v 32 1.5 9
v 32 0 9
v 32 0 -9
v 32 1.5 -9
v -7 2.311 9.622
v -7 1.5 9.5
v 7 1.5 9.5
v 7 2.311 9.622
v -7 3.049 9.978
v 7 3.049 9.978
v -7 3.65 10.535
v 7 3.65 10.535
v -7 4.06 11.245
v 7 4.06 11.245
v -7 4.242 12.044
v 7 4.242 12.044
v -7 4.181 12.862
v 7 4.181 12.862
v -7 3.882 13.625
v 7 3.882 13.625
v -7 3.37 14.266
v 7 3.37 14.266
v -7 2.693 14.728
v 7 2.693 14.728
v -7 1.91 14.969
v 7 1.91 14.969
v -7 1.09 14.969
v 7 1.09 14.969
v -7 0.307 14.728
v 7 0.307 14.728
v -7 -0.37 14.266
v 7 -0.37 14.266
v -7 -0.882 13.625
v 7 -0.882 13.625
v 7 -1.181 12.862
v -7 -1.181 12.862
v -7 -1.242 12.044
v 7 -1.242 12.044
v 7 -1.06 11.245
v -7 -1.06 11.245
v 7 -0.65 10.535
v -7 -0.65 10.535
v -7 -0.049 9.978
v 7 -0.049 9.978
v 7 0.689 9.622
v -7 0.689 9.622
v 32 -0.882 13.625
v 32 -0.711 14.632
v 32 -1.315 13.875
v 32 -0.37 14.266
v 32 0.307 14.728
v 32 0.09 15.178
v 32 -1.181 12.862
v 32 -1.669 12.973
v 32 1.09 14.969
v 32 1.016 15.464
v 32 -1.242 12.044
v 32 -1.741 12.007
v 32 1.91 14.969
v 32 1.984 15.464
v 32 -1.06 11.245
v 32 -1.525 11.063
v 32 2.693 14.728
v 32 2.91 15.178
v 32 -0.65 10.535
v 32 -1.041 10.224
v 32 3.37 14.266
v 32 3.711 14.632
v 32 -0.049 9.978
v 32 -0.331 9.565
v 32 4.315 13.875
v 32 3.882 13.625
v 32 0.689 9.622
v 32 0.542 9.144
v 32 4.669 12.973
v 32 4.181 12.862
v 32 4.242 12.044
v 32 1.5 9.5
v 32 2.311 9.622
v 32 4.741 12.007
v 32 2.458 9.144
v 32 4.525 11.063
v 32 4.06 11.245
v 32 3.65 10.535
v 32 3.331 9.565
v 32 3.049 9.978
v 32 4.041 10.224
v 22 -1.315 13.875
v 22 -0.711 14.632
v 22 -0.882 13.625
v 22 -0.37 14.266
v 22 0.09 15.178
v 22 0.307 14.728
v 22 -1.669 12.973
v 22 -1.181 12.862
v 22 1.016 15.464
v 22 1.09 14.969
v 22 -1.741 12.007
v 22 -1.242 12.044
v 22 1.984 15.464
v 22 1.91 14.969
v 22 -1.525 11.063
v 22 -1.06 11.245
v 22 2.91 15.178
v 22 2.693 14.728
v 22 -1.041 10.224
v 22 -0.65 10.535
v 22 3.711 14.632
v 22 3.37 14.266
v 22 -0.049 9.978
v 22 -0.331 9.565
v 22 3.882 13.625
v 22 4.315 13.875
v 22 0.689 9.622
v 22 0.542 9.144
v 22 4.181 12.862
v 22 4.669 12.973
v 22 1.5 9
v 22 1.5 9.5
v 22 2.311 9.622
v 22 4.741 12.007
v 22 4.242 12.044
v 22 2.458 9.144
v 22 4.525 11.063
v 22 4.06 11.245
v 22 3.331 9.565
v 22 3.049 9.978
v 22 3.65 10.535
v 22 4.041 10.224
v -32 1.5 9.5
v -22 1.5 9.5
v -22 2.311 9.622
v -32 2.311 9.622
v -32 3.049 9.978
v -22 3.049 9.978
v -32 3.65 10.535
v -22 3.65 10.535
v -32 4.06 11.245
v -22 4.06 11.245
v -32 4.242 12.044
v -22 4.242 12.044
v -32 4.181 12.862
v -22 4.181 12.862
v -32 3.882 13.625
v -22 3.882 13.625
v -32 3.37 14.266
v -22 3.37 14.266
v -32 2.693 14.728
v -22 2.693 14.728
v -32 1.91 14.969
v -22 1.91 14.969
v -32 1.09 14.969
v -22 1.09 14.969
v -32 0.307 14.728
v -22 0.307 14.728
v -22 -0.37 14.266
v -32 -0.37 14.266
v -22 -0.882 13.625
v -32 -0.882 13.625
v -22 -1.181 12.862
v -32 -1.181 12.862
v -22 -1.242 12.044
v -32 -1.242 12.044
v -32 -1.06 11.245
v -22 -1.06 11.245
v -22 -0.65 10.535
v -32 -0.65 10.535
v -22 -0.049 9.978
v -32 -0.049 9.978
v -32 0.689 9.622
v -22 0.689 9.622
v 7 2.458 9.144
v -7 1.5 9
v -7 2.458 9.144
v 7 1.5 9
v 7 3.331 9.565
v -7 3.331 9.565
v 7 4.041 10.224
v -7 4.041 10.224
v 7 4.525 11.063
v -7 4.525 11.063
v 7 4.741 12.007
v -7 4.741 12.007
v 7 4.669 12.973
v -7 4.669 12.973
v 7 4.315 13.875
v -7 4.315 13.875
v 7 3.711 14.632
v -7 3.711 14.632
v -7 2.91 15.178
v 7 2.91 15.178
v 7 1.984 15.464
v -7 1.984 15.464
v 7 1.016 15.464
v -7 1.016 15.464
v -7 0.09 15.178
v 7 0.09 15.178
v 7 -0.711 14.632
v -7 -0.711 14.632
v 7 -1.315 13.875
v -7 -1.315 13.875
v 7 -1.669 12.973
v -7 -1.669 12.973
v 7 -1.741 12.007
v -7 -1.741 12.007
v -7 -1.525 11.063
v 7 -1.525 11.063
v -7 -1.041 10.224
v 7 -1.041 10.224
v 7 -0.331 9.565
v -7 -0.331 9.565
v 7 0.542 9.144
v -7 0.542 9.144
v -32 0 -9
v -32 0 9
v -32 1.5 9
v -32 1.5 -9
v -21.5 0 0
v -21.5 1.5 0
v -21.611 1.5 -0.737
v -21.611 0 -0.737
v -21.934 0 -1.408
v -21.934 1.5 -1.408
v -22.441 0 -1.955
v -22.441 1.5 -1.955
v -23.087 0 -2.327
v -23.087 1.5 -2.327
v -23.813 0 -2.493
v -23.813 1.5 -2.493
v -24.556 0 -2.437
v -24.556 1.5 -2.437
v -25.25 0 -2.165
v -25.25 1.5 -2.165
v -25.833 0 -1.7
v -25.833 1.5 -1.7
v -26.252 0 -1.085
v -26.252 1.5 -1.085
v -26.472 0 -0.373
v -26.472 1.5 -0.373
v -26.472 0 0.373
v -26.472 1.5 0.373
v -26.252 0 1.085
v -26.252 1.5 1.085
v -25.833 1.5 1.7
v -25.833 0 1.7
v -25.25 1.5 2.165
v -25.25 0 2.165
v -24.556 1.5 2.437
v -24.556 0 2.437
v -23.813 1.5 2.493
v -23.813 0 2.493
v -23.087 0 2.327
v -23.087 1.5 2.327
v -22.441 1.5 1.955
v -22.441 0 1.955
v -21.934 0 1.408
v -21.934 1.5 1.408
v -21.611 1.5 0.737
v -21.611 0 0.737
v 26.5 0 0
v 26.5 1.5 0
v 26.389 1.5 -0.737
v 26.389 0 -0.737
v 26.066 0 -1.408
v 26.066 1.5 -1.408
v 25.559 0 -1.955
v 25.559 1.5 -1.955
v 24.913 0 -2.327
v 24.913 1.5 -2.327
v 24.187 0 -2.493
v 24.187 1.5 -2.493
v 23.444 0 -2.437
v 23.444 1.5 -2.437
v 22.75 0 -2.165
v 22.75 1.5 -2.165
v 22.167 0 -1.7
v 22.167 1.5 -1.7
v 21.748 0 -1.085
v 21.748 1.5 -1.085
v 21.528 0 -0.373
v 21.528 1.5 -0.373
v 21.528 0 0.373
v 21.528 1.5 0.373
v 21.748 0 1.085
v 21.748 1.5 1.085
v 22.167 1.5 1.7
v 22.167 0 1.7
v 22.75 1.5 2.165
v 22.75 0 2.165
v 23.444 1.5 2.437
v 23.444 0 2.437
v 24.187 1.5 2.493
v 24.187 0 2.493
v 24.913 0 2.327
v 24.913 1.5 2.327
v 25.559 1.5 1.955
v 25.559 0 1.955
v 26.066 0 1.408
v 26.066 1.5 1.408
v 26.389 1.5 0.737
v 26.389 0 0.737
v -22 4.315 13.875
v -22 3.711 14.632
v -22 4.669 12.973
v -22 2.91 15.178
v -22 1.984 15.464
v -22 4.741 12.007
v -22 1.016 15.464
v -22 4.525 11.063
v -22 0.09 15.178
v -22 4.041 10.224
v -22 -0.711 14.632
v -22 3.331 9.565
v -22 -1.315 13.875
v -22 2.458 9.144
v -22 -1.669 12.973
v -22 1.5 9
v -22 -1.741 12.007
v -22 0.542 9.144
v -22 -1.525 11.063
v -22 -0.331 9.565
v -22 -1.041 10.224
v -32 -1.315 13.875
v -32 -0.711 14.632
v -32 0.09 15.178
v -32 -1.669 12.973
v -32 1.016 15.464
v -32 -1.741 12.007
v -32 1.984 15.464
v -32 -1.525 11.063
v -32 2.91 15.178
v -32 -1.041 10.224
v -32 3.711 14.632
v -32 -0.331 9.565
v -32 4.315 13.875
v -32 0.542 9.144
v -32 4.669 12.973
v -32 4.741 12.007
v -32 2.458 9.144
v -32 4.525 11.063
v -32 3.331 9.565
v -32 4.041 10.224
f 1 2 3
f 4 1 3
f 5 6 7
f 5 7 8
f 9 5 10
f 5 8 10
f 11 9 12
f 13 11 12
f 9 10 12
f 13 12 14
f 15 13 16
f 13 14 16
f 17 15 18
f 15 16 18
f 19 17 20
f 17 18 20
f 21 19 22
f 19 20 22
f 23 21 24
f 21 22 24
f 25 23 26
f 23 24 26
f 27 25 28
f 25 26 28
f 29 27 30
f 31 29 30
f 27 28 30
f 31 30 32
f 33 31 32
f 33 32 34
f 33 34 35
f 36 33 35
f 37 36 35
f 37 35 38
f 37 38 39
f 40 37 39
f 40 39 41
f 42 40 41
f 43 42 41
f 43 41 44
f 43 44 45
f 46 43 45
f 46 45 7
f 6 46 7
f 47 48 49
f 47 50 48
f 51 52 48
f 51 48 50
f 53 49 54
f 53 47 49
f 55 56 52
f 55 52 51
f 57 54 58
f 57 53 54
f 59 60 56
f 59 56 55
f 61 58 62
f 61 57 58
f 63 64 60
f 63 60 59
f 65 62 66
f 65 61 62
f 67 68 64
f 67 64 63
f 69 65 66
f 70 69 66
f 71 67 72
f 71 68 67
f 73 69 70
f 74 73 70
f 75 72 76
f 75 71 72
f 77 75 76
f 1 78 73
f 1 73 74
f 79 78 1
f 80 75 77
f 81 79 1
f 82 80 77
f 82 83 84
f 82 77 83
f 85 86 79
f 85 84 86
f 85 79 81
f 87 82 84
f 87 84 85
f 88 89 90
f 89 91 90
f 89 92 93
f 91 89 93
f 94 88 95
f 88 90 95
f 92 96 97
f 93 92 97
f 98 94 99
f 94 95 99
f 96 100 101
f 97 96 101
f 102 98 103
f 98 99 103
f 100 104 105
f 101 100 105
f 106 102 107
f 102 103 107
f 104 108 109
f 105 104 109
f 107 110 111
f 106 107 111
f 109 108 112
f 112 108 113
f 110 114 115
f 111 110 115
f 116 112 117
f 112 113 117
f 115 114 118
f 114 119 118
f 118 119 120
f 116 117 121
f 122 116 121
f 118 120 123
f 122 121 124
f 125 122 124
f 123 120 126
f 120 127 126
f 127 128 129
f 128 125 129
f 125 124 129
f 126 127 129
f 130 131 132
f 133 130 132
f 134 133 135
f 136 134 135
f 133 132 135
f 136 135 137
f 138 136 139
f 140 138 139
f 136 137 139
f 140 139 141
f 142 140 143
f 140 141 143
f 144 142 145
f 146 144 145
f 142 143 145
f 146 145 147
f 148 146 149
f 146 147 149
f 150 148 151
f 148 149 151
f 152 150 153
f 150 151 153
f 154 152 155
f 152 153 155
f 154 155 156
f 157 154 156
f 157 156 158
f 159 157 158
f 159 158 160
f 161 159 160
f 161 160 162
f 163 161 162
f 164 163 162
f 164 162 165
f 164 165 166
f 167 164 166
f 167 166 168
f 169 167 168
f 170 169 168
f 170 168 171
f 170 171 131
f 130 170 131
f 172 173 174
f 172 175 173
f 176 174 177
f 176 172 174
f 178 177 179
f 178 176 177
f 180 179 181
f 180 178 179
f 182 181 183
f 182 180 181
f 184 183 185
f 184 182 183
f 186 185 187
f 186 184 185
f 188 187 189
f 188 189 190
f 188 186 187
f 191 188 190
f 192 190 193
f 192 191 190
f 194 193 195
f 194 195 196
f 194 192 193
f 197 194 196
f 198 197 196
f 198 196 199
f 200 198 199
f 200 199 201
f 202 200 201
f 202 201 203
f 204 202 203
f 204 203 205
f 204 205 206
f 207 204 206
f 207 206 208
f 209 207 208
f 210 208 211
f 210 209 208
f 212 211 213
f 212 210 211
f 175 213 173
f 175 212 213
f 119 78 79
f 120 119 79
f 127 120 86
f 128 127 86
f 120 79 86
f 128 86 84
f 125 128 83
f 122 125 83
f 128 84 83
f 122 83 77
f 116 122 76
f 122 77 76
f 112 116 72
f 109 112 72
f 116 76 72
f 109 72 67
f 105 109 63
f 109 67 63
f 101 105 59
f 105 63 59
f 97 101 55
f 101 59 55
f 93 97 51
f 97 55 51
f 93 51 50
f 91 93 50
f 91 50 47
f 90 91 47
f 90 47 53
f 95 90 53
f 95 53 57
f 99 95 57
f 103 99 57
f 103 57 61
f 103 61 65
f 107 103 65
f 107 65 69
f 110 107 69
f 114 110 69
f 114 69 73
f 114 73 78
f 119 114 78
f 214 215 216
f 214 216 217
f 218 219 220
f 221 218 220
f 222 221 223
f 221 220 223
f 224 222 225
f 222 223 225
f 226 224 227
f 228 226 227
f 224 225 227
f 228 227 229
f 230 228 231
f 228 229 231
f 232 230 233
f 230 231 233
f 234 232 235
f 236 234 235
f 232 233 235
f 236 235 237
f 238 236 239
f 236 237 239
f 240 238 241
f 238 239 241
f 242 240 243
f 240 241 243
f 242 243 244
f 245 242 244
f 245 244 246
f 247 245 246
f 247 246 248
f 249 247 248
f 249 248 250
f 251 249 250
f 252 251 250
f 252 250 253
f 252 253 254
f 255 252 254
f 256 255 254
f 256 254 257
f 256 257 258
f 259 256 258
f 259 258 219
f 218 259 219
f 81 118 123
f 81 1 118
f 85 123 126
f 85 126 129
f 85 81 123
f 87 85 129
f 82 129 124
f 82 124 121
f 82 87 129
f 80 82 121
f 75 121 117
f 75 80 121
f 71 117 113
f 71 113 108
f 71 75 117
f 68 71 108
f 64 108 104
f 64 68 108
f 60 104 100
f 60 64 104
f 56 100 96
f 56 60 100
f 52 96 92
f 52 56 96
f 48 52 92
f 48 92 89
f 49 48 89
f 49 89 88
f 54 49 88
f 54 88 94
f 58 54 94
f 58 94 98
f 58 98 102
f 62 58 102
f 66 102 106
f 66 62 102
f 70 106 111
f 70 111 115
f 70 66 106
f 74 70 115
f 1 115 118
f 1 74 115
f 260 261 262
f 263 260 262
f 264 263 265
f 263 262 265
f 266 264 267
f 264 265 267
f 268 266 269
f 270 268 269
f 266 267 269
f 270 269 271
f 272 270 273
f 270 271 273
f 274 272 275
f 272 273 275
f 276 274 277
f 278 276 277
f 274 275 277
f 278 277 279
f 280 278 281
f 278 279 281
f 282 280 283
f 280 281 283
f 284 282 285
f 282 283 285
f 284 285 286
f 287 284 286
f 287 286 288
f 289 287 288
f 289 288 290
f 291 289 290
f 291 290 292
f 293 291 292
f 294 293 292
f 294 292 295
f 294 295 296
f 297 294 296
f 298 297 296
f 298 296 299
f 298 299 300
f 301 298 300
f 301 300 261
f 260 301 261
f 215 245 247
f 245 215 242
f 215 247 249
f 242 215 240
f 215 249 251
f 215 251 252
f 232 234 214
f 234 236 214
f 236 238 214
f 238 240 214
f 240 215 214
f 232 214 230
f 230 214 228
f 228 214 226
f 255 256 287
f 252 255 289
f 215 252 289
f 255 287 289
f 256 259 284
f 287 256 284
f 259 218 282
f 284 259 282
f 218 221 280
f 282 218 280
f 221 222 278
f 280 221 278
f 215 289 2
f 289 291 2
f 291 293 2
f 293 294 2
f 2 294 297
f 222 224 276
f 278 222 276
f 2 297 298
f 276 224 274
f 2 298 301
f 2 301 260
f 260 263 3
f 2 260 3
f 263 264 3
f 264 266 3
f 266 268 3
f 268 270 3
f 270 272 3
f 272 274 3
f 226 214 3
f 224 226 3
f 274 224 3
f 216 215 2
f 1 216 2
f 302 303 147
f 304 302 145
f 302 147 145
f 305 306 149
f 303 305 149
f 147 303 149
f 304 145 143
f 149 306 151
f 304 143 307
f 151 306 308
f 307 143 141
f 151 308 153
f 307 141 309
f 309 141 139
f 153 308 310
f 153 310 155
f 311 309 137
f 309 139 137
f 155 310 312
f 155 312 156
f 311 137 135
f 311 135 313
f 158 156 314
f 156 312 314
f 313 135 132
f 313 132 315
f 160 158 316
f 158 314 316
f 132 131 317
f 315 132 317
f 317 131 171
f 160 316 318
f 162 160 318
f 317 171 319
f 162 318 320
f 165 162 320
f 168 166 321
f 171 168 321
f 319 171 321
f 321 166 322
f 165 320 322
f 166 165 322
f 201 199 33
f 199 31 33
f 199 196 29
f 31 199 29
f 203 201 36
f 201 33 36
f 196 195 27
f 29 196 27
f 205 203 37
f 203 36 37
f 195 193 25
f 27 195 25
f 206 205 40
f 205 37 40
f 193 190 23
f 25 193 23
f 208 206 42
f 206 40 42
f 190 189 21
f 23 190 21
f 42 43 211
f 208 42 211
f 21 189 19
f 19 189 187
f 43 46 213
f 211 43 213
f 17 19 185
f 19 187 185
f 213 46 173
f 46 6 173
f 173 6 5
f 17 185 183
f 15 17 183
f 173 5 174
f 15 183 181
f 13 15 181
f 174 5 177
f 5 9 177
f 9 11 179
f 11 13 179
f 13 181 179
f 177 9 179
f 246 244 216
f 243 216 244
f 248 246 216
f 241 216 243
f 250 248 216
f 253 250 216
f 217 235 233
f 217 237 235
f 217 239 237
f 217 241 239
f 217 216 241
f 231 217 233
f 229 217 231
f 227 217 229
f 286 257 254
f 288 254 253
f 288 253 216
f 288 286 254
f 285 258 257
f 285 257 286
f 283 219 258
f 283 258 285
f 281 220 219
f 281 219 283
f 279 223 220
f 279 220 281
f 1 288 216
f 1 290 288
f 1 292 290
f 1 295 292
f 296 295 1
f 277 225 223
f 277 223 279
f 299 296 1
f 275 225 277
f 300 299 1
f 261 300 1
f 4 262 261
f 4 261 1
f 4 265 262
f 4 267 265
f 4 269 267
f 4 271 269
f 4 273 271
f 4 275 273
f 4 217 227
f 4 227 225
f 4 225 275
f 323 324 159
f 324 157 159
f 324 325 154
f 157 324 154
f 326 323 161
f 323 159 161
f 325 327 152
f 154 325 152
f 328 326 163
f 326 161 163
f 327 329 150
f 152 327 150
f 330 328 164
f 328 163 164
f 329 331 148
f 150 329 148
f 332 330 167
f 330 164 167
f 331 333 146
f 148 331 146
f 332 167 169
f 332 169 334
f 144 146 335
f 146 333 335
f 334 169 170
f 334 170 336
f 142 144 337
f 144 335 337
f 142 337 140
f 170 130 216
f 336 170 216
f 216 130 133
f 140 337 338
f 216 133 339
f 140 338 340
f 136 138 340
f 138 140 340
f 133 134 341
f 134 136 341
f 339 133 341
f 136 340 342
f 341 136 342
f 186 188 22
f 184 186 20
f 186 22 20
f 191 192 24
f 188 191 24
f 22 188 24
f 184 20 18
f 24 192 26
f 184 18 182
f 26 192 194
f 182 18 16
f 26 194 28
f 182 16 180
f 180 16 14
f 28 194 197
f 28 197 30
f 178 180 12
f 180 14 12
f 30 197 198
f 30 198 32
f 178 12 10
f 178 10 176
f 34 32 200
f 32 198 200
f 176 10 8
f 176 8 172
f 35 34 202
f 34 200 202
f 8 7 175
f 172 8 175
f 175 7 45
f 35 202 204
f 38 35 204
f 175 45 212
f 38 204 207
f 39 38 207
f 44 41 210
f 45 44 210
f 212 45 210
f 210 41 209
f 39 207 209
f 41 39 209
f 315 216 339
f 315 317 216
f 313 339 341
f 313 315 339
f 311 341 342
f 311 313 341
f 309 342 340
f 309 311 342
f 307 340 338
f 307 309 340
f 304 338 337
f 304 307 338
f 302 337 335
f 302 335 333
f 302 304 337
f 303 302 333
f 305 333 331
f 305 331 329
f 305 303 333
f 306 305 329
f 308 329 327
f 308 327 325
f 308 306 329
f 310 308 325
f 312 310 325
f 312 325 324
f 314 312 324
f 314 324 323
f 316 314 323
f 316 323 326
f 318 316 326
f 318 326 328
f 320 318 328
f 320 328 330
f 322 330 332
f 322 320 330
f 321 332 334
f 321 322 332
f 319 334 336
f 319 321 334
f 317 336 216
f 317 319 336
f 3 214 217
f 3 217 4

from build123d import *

# Parameters (mm, degrees)
SKETCH1_W               = 64
SKETCH1_H               = 18
BOSS_EXTRUDE1_DEPTH     = 1.5
SKETCH2_R               = 3.25
BOSS_EXTRUDE2_DEPTH     = 32
SKETCH3_R               = 2.5
CUT_EXTRUDE1_DEPTH      = 10
SKETCH4_W               = 15
SKETCH4_H               = 6.5
CUT_EXTRUDE4_DEPTH      = 44
CUT_EXTRUDE4_DEPTH_BACK = 44
SKETCH6_R               = 2.75
CUT_EXTRUDE5_DEPTH      = 64


with BuildPart() as part:
    # Sketch1 → Boss-Extrude1 (new body)
    with BuildSketch(Plane(origin=(0, 0, 0), x_dir=(1, 0, 0), z_dir=(0, 1, 0))):
        Rectangle(SKETCH1_W, SKETCH1_H)
    extrude(amount=BOSS_EXTRUDE1_DEPTH)

    # Sketch3 → Cut-Extrude1 (cut)
    with BuildSketch(Plane(origin=(0, 1.5, 0), x_dir=(1, 0, 0), z_dir=(0, 1, 0))):
        with Locations((-24, 0)):
            Circle(SKETCH3_R)
        with Locations((24, 0)):
            Circle(SKETCH3_R)
    extrude(amount=-CUT_EXTRUDE1_DEPTH, mode=Mode.SUBTRACT)


with BuildPart() as body_2:
    # Sketch2 → Boss-Extrude2 (new body, symmetric)
    with BuildSketch(Plane(origin=(0, 0, 0), x_dir=(0, 0, -1), z_dir=(1, 0, 0))):
        with Locations((-12.25, 1.5)):
            Circle(SKETCH2_R)
    extrude(amount=BOSS_EXTRUDE2_DEPTH, both=True)

    # Sketch4 → Cut-Extrude4 (cut, two sides)
    with BuildSketch(Plane(origin=(0, 0, 0), x_dir=(1, 0, 0), z_dir=(0, 1, 0))) as cut_extrude4_sk:
        with Locations((-14.5, -12.25)):
            Rectangle(SKETCH4_W, SKETCH4_H)
        with Locations((14.5, -12.25)):
            Rectangle(SKETCH4_W, SKETCH4_H)
    extrude(amount=CUT_EXTRUDE4_DEPTH, mode=Mode.SUBTRACT)
    extrude(cut_extrude4_sk.sketch, amount=-CUT_EXTRUDE4_DEPTH_BACK, mode=Mode.SUBTRACT)

    # Sketch6 → Cut-Extrude5 (cut)
    with BuildSketch(Plane(origin=(32, 0, 0), x_dir=(0, 0, -1), z_dir=(1, 0, 0))):
        with Locations((-12.25, 1.5)):
            Circle(SKETCH6_R)
    extrude(amount=-CUT_EXTRUDE5_DEPTH, mode=Mode.SUBTRACT)


solid = Compound([part.part, body_2.part])
